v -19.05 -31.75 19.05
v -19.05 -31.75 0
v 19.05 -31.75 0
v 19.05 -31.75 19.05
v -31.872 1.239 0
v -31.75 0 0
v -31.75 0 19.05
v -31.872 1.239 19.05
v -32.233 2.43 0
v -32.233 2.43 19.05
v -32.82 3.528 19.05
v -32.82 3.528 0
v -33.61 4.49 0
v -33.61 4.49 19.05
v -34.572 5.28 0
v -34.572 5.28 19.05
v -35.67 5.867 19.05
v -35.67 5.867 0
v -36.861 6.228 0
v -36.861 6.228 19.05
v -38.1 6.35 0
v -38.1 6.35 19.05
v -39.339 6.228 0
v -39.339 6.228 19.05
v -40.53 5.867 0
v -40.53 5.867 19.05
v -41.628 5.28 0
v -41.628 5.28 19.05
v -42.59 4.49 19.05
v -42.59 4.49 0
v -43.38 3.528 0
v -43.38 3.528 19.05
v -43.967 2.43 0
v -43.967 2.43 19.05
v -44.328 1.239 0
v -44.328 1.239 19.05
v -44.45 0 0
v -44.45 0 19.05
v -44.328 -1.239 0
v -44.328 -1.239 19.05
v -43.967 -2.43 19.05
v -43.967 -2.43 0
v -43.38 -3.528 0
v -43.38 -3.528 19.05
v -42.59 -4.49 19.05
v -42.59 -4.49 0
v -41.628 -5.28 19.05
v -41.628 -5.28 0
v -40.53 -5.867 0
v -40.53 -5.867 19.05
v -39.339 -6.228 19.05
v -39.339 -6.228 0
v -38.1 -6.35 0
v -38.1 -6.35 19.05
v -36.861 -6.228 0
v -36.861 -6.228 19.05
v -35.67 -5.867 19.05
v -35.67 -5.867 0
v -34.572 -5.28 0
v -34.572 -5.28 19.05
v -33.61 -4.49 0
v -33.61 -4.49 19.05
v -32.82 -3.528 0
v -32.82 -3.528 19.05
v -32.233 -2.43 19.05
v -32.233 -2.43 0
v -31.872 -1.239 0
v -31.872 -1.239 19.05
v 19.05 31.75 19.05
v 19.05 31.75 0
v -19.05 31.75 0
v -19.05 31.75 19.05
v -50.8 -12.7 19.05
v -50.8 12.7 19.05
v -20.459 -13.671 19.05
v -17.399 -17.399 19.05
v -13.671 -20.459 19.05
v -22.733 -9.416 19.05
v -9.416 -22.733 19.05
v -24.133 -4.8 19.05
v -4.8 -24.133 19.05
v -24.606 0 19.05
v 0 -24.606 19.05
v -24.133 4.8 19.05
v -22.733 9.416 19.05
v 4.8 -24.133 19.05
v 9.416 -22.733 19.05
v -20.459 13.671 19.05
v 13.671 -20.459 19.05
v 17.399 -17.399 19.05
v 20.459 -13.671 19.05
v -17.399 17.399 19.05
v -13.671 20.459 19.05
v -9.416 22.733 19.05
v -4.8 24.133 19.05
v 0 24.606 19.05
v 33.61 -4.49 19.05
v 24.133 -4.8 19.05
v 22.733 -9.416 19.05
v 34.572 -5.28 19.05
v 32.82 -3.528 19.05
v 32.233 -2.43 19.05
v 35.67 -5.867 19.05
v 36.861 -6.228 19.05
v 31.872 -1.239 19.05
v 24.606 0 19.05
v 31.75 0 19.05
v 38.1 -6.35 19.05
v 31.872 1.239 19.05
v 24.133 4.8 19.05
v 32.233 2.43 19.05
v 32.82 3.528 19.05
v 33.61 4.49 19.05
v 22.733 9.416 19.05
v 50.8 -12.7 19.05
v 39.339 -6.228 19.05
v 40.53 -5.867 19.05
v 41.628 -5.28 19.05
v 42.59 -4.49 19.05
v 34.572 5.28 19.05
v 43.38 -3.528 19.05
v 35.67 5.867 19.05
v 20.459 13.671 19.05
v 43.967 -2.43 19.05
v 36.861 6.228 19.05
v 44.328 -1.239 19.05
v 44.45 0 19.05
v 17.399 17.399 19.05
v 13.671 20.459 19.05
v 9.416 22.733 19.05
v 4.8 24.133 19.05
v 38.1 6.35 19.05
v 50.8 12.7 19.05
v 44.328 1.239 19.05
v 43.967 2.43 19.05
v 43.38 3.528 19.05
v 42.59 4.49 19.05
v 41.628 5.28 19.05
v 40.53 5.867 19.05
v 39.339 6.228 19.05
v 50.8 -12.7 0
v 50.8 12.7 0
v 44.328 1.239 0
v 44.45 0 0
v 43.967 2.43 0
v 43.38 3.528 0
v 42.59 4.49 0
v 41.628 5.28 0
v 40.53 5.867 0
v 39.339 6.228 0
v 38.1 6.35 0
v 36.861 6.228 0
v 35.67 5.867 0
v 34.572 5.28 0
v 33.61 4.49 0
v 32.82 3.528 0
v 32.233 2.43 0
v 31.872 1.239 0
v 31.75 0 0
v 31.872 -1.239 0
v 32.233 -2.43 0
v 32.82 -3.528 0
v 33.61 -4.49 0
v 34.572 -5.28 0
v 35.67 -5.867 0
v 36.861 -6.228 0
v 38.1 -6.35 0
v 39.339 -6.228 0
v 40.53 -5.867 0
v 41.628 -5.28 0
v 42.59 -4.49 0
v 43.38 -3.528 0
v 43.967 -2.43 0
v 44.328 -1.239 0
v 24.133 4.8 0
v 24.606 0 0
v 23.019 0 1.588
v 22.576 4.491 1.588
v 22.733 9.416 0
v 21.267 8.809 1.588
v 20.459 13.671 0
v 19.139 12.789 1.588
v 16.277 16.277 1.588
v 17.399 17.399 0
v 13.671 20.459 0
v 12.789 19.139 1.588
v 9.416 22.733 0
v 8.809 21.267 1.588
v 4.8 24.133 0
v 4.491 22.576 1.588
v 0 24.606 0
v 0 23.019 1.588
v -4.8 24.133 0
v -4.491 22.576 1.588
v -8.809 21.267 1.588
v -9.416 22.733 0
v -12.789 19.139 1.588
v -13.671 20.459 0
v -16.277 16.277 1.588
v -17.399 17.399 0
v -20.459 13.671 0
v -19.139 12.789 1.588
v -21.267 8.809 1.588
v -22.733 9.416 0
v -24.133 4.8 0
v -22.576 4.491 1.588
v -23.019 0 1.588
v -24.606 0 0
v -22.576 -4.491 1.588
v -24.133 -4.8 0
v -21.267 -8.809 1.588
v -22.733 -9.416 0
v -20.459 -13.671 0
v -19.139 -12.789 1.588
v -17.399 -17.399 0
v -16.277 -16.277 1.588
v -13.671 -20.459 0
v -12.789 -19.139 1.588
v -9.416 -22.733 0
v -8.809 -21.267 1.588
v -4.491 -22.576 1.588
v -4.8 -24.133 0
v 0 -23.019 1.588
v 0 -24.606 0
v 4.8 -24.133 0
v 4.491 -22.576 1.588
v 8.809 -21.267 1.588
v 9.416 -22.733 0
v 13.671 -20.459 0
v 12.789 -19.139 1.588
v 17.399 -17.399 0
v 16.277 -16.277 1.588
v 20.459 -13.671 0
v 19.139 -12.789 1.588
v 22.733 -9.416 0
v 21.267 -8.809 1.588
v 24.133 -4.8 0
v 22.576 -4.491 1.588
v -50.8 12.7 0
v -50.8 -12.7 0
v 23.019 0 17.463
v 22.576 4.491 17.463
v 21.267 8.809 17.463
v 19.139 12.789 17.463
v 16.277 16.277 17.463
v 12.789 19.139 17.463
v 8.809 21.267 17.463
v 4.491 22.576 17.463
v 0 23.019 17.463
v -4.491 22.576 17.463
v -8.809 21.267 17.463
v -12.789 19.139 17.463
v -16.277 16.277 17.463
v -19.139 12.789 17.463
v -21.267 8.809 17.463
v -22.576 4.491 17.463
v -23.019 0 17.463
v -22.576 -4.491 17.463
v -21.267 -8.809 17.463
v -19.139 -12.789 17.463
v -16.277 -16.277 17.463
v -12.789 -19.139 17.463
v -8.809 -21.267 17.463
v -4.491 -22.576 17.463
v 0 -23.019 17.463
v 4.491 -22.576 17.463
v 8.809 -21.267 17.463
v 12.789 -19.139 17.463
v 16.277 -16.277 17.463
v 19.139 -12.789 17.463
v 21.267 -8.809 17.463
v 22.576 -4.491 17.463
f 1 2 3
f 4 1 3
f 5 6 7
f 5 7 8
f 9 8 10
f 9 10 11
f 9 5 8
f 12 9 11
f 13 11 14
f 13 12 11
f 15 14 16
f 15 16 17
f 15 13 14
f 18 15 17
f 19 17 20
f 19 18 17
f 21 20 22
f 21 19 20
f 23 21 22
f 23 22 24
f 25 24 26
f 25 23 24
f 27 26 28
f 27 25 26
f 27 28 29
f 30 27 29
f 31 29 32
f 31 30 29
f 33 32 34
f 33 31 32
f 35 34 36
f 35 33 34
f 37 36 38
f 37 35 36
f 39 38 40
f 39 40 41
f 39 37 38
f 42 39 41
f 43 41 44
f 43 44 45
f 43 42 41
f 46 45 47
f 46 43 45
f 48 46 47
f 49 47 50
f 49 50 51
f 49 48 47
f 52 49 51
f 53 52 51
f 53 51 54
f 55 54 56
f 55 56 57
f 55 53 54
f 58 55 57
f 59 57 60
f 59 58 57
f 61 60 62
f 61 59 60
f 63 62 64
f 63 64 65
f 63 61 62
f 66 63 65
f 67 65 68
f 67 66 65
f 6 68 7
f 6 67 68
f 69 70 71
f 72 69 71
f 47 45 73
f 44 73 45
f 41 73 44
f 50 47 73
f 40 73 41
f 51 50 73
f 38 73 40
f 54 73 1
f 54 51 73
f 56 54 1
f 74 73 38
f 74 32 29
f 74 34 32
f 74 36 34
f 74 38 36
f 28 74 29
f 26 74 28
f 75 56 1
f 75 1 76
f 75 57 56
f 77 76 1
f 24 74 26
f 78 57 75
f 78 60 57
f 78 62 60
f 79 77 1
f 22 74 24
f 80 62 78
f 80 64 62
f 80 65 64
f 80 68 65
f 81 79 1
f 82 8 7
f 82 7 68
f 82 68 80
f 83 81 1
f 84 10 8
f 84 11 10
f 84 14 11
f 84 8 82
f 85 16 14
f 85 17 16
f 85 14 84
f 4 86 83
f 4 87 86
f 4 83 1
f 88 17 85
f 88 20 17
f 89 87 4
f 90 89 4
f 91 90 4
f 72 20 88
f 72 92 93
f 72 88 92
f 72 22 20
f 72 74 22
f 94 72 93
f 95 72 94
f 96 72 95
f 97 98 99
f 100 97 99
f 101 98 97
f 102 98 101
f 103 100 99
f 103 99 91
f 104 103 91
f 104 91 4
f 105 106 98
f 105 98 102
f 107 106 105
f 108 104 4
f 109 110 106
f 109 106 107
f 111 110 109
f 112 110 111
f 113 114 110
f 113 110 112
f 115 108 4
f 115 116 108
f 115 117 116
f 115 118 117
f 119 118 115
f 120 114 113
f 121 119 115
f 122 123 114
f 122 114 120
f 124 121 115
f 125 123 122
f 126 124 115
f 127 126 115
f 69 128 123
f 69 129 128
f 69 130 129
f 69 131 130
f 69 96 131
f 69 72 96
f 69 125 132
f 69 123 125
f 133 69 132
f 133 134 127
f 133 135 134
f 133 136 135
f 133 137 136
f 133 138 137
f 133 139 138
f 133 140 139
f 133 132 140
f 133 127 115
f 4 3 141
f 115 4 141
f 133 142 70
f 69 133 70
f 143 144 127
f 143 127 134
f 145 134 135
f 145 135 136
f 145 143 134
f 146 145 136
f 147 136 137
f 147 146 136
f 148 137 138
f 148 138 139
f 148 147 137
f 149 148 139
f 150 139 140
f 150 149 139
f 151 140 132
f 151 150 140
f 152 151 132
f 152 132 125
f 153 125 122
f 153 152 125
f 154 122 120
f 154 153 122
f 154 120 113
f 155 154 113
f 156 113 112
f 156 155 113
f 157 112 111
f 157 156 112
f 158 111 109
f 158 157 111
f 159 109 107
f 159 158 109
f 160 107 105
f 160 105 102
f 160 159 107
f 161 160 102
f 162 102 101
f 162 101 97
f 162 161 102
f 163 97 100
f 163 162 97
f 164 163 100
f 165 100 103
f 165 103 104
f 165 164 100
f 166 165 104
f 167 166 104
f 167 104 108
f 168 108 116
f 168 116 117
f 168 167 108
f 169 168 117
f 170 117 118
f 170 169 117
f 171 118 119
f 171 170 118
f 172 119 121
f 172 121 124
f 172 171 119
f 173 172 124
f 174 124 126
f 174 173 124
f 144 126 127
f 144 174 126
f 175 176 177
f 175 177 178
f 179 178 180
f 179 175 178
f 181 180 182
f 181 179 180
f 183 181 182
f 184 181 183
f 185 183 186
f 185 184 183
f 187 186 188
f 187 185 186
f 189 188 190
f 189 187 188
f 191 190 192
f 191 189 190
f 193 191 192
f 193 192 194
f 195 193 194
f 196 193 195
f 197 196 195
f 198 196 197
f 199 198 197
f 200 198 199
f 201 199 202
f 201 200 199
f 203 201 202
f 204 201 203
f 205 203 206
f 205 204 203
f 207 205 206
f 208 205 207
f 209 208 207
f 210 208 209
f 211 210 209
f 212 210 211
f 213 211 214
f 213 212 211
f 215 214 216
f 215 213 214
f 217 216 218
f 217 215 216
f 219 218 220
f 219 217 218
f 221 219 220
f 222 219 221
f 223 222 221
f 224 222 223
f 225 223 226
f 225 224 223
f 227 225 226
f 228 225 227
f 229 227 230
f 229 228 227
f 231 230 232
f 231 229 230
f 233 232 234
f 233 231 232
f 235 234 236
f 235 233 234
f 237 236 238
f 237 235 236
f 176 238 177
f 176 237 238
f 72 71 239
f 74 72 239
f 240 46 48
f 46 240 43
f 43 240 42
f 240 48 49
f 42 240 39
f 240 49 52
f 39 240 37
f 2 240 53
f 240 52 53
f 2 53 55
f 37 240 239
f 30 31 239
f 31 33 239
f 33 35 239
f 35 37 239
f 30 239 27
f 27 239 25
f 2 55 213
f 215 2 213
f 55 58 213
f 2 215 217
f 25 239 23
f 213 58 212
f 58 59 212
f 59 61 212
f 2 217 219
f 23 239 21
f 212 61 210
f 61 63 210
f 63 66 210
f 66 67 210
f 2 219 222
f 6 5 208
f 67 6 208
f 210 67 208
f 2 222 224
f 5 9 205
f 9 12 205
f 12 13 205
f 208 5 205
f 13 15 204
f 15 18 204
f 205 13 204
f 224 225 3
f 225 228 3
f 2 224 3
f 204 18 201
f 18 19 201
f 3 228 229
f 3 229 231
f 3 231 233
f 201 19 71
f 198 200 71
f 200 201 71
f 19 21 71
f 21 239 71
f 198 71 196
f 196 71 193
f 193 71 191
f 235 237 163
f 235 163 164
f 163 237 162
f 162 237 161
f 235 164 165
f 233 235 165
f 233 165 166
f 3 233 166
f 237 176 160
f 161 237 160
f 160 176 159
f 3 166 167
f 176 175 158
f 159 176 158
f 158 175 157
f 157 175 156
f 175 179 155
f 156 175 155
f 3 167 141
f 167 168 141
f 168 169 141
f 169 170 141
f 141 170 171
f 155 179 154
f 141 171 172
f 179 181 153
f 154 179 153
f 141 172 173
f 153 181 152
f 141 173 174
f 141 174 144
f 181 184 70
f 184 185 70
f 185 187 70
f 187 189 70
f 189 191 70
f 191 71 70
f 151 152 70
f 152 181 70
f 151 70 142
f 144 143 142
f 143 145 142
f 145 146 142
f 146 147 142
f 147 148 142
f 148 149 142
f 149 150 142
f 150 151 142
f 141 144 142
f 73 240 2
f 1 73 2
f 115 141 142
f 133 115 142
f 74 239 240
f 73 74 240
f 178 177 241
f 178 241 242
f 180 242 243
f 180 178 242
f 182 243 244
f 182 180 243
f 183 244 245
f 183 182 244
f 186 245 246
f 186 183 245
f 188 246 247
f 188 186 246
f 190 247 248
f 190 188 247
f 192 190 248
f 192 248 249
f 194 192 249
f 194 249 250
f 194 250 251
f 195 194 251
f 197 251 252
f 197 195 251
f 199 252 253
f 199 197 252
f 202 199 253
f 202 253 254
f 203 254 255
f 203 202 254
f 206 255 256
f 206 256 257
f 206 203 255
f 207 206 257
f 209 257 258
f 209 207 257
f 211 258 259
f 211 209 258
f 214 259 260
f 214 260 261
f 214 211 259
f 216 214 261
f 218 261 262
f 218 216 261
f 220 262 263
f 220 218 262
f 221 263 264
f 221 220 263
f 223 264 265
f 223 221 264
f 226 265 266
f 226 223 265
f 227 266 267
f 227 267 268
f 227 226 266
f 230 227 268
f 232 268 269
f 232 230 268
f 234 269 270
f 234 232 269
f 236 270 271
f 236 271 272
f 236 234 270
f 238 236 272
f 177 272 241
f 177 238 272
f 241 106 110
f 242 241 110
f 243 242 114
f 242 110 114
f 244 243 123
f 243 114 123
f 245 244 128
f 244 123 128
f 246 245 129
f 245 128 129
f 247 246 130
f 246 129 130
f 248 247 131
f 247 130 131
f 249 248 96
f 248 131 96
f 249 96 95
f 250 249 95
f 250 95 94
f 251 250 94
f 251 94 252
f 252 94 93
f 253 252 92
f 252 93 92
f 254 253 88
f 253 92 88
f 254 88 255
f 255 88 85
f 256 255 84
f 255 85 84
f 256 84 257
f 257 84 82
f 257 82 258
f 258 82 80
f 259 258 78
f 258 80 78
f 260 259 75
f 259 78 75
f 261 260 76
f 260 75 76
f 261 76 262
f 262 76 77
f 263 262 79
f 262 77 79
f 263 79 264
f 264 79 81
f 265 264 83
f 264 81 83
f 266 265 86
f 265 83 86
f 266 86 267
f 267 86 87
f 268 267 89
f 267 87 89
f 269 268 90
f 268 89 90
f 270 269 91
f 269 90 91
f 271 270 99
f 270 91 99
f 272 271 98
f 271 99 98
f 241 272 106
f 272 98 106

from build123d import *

# Parameters (mm, degrees)
F0_R     = 6.35
F0_R_2   = 23.01875
F1_DEPTH = 19.05
F2_SIZE  = 1.5875


with BuildPart() as f1:
    # F0 (on Top) → F1 (new body)
    with BuildSketch(Plane.XY):
        Polygon((-19.05, -31.75), (19.05, -31.75), (50.8, -12.7), (50.8, 12.7), (19.05, 31.75), (-19.05, 31.75), (-50.8, 12.7), (-50.8, -12.7), align=None)
        with Locations((-38.1, 0)):
            Circle(F0_R, mode=Mode.SUBTRACT)
        Circle(F0_R_2, mode=Mode.SUBTRACT)
        with Locations((38.1, 0)):
            Circle(F0_R, mode=Mode.SUBTRACT)
    extrude(amount=F1_DEPTH)

    # F2
    f2_edges = [f1.edges().sort_by_distance(p)[0] for p in [
        (-23.01875, 0, 0),
        (-23.01875, 0, 19.05),
    ]]
    chamfer(f2_edges, length=F2_SIZE)


solid = f1.part
